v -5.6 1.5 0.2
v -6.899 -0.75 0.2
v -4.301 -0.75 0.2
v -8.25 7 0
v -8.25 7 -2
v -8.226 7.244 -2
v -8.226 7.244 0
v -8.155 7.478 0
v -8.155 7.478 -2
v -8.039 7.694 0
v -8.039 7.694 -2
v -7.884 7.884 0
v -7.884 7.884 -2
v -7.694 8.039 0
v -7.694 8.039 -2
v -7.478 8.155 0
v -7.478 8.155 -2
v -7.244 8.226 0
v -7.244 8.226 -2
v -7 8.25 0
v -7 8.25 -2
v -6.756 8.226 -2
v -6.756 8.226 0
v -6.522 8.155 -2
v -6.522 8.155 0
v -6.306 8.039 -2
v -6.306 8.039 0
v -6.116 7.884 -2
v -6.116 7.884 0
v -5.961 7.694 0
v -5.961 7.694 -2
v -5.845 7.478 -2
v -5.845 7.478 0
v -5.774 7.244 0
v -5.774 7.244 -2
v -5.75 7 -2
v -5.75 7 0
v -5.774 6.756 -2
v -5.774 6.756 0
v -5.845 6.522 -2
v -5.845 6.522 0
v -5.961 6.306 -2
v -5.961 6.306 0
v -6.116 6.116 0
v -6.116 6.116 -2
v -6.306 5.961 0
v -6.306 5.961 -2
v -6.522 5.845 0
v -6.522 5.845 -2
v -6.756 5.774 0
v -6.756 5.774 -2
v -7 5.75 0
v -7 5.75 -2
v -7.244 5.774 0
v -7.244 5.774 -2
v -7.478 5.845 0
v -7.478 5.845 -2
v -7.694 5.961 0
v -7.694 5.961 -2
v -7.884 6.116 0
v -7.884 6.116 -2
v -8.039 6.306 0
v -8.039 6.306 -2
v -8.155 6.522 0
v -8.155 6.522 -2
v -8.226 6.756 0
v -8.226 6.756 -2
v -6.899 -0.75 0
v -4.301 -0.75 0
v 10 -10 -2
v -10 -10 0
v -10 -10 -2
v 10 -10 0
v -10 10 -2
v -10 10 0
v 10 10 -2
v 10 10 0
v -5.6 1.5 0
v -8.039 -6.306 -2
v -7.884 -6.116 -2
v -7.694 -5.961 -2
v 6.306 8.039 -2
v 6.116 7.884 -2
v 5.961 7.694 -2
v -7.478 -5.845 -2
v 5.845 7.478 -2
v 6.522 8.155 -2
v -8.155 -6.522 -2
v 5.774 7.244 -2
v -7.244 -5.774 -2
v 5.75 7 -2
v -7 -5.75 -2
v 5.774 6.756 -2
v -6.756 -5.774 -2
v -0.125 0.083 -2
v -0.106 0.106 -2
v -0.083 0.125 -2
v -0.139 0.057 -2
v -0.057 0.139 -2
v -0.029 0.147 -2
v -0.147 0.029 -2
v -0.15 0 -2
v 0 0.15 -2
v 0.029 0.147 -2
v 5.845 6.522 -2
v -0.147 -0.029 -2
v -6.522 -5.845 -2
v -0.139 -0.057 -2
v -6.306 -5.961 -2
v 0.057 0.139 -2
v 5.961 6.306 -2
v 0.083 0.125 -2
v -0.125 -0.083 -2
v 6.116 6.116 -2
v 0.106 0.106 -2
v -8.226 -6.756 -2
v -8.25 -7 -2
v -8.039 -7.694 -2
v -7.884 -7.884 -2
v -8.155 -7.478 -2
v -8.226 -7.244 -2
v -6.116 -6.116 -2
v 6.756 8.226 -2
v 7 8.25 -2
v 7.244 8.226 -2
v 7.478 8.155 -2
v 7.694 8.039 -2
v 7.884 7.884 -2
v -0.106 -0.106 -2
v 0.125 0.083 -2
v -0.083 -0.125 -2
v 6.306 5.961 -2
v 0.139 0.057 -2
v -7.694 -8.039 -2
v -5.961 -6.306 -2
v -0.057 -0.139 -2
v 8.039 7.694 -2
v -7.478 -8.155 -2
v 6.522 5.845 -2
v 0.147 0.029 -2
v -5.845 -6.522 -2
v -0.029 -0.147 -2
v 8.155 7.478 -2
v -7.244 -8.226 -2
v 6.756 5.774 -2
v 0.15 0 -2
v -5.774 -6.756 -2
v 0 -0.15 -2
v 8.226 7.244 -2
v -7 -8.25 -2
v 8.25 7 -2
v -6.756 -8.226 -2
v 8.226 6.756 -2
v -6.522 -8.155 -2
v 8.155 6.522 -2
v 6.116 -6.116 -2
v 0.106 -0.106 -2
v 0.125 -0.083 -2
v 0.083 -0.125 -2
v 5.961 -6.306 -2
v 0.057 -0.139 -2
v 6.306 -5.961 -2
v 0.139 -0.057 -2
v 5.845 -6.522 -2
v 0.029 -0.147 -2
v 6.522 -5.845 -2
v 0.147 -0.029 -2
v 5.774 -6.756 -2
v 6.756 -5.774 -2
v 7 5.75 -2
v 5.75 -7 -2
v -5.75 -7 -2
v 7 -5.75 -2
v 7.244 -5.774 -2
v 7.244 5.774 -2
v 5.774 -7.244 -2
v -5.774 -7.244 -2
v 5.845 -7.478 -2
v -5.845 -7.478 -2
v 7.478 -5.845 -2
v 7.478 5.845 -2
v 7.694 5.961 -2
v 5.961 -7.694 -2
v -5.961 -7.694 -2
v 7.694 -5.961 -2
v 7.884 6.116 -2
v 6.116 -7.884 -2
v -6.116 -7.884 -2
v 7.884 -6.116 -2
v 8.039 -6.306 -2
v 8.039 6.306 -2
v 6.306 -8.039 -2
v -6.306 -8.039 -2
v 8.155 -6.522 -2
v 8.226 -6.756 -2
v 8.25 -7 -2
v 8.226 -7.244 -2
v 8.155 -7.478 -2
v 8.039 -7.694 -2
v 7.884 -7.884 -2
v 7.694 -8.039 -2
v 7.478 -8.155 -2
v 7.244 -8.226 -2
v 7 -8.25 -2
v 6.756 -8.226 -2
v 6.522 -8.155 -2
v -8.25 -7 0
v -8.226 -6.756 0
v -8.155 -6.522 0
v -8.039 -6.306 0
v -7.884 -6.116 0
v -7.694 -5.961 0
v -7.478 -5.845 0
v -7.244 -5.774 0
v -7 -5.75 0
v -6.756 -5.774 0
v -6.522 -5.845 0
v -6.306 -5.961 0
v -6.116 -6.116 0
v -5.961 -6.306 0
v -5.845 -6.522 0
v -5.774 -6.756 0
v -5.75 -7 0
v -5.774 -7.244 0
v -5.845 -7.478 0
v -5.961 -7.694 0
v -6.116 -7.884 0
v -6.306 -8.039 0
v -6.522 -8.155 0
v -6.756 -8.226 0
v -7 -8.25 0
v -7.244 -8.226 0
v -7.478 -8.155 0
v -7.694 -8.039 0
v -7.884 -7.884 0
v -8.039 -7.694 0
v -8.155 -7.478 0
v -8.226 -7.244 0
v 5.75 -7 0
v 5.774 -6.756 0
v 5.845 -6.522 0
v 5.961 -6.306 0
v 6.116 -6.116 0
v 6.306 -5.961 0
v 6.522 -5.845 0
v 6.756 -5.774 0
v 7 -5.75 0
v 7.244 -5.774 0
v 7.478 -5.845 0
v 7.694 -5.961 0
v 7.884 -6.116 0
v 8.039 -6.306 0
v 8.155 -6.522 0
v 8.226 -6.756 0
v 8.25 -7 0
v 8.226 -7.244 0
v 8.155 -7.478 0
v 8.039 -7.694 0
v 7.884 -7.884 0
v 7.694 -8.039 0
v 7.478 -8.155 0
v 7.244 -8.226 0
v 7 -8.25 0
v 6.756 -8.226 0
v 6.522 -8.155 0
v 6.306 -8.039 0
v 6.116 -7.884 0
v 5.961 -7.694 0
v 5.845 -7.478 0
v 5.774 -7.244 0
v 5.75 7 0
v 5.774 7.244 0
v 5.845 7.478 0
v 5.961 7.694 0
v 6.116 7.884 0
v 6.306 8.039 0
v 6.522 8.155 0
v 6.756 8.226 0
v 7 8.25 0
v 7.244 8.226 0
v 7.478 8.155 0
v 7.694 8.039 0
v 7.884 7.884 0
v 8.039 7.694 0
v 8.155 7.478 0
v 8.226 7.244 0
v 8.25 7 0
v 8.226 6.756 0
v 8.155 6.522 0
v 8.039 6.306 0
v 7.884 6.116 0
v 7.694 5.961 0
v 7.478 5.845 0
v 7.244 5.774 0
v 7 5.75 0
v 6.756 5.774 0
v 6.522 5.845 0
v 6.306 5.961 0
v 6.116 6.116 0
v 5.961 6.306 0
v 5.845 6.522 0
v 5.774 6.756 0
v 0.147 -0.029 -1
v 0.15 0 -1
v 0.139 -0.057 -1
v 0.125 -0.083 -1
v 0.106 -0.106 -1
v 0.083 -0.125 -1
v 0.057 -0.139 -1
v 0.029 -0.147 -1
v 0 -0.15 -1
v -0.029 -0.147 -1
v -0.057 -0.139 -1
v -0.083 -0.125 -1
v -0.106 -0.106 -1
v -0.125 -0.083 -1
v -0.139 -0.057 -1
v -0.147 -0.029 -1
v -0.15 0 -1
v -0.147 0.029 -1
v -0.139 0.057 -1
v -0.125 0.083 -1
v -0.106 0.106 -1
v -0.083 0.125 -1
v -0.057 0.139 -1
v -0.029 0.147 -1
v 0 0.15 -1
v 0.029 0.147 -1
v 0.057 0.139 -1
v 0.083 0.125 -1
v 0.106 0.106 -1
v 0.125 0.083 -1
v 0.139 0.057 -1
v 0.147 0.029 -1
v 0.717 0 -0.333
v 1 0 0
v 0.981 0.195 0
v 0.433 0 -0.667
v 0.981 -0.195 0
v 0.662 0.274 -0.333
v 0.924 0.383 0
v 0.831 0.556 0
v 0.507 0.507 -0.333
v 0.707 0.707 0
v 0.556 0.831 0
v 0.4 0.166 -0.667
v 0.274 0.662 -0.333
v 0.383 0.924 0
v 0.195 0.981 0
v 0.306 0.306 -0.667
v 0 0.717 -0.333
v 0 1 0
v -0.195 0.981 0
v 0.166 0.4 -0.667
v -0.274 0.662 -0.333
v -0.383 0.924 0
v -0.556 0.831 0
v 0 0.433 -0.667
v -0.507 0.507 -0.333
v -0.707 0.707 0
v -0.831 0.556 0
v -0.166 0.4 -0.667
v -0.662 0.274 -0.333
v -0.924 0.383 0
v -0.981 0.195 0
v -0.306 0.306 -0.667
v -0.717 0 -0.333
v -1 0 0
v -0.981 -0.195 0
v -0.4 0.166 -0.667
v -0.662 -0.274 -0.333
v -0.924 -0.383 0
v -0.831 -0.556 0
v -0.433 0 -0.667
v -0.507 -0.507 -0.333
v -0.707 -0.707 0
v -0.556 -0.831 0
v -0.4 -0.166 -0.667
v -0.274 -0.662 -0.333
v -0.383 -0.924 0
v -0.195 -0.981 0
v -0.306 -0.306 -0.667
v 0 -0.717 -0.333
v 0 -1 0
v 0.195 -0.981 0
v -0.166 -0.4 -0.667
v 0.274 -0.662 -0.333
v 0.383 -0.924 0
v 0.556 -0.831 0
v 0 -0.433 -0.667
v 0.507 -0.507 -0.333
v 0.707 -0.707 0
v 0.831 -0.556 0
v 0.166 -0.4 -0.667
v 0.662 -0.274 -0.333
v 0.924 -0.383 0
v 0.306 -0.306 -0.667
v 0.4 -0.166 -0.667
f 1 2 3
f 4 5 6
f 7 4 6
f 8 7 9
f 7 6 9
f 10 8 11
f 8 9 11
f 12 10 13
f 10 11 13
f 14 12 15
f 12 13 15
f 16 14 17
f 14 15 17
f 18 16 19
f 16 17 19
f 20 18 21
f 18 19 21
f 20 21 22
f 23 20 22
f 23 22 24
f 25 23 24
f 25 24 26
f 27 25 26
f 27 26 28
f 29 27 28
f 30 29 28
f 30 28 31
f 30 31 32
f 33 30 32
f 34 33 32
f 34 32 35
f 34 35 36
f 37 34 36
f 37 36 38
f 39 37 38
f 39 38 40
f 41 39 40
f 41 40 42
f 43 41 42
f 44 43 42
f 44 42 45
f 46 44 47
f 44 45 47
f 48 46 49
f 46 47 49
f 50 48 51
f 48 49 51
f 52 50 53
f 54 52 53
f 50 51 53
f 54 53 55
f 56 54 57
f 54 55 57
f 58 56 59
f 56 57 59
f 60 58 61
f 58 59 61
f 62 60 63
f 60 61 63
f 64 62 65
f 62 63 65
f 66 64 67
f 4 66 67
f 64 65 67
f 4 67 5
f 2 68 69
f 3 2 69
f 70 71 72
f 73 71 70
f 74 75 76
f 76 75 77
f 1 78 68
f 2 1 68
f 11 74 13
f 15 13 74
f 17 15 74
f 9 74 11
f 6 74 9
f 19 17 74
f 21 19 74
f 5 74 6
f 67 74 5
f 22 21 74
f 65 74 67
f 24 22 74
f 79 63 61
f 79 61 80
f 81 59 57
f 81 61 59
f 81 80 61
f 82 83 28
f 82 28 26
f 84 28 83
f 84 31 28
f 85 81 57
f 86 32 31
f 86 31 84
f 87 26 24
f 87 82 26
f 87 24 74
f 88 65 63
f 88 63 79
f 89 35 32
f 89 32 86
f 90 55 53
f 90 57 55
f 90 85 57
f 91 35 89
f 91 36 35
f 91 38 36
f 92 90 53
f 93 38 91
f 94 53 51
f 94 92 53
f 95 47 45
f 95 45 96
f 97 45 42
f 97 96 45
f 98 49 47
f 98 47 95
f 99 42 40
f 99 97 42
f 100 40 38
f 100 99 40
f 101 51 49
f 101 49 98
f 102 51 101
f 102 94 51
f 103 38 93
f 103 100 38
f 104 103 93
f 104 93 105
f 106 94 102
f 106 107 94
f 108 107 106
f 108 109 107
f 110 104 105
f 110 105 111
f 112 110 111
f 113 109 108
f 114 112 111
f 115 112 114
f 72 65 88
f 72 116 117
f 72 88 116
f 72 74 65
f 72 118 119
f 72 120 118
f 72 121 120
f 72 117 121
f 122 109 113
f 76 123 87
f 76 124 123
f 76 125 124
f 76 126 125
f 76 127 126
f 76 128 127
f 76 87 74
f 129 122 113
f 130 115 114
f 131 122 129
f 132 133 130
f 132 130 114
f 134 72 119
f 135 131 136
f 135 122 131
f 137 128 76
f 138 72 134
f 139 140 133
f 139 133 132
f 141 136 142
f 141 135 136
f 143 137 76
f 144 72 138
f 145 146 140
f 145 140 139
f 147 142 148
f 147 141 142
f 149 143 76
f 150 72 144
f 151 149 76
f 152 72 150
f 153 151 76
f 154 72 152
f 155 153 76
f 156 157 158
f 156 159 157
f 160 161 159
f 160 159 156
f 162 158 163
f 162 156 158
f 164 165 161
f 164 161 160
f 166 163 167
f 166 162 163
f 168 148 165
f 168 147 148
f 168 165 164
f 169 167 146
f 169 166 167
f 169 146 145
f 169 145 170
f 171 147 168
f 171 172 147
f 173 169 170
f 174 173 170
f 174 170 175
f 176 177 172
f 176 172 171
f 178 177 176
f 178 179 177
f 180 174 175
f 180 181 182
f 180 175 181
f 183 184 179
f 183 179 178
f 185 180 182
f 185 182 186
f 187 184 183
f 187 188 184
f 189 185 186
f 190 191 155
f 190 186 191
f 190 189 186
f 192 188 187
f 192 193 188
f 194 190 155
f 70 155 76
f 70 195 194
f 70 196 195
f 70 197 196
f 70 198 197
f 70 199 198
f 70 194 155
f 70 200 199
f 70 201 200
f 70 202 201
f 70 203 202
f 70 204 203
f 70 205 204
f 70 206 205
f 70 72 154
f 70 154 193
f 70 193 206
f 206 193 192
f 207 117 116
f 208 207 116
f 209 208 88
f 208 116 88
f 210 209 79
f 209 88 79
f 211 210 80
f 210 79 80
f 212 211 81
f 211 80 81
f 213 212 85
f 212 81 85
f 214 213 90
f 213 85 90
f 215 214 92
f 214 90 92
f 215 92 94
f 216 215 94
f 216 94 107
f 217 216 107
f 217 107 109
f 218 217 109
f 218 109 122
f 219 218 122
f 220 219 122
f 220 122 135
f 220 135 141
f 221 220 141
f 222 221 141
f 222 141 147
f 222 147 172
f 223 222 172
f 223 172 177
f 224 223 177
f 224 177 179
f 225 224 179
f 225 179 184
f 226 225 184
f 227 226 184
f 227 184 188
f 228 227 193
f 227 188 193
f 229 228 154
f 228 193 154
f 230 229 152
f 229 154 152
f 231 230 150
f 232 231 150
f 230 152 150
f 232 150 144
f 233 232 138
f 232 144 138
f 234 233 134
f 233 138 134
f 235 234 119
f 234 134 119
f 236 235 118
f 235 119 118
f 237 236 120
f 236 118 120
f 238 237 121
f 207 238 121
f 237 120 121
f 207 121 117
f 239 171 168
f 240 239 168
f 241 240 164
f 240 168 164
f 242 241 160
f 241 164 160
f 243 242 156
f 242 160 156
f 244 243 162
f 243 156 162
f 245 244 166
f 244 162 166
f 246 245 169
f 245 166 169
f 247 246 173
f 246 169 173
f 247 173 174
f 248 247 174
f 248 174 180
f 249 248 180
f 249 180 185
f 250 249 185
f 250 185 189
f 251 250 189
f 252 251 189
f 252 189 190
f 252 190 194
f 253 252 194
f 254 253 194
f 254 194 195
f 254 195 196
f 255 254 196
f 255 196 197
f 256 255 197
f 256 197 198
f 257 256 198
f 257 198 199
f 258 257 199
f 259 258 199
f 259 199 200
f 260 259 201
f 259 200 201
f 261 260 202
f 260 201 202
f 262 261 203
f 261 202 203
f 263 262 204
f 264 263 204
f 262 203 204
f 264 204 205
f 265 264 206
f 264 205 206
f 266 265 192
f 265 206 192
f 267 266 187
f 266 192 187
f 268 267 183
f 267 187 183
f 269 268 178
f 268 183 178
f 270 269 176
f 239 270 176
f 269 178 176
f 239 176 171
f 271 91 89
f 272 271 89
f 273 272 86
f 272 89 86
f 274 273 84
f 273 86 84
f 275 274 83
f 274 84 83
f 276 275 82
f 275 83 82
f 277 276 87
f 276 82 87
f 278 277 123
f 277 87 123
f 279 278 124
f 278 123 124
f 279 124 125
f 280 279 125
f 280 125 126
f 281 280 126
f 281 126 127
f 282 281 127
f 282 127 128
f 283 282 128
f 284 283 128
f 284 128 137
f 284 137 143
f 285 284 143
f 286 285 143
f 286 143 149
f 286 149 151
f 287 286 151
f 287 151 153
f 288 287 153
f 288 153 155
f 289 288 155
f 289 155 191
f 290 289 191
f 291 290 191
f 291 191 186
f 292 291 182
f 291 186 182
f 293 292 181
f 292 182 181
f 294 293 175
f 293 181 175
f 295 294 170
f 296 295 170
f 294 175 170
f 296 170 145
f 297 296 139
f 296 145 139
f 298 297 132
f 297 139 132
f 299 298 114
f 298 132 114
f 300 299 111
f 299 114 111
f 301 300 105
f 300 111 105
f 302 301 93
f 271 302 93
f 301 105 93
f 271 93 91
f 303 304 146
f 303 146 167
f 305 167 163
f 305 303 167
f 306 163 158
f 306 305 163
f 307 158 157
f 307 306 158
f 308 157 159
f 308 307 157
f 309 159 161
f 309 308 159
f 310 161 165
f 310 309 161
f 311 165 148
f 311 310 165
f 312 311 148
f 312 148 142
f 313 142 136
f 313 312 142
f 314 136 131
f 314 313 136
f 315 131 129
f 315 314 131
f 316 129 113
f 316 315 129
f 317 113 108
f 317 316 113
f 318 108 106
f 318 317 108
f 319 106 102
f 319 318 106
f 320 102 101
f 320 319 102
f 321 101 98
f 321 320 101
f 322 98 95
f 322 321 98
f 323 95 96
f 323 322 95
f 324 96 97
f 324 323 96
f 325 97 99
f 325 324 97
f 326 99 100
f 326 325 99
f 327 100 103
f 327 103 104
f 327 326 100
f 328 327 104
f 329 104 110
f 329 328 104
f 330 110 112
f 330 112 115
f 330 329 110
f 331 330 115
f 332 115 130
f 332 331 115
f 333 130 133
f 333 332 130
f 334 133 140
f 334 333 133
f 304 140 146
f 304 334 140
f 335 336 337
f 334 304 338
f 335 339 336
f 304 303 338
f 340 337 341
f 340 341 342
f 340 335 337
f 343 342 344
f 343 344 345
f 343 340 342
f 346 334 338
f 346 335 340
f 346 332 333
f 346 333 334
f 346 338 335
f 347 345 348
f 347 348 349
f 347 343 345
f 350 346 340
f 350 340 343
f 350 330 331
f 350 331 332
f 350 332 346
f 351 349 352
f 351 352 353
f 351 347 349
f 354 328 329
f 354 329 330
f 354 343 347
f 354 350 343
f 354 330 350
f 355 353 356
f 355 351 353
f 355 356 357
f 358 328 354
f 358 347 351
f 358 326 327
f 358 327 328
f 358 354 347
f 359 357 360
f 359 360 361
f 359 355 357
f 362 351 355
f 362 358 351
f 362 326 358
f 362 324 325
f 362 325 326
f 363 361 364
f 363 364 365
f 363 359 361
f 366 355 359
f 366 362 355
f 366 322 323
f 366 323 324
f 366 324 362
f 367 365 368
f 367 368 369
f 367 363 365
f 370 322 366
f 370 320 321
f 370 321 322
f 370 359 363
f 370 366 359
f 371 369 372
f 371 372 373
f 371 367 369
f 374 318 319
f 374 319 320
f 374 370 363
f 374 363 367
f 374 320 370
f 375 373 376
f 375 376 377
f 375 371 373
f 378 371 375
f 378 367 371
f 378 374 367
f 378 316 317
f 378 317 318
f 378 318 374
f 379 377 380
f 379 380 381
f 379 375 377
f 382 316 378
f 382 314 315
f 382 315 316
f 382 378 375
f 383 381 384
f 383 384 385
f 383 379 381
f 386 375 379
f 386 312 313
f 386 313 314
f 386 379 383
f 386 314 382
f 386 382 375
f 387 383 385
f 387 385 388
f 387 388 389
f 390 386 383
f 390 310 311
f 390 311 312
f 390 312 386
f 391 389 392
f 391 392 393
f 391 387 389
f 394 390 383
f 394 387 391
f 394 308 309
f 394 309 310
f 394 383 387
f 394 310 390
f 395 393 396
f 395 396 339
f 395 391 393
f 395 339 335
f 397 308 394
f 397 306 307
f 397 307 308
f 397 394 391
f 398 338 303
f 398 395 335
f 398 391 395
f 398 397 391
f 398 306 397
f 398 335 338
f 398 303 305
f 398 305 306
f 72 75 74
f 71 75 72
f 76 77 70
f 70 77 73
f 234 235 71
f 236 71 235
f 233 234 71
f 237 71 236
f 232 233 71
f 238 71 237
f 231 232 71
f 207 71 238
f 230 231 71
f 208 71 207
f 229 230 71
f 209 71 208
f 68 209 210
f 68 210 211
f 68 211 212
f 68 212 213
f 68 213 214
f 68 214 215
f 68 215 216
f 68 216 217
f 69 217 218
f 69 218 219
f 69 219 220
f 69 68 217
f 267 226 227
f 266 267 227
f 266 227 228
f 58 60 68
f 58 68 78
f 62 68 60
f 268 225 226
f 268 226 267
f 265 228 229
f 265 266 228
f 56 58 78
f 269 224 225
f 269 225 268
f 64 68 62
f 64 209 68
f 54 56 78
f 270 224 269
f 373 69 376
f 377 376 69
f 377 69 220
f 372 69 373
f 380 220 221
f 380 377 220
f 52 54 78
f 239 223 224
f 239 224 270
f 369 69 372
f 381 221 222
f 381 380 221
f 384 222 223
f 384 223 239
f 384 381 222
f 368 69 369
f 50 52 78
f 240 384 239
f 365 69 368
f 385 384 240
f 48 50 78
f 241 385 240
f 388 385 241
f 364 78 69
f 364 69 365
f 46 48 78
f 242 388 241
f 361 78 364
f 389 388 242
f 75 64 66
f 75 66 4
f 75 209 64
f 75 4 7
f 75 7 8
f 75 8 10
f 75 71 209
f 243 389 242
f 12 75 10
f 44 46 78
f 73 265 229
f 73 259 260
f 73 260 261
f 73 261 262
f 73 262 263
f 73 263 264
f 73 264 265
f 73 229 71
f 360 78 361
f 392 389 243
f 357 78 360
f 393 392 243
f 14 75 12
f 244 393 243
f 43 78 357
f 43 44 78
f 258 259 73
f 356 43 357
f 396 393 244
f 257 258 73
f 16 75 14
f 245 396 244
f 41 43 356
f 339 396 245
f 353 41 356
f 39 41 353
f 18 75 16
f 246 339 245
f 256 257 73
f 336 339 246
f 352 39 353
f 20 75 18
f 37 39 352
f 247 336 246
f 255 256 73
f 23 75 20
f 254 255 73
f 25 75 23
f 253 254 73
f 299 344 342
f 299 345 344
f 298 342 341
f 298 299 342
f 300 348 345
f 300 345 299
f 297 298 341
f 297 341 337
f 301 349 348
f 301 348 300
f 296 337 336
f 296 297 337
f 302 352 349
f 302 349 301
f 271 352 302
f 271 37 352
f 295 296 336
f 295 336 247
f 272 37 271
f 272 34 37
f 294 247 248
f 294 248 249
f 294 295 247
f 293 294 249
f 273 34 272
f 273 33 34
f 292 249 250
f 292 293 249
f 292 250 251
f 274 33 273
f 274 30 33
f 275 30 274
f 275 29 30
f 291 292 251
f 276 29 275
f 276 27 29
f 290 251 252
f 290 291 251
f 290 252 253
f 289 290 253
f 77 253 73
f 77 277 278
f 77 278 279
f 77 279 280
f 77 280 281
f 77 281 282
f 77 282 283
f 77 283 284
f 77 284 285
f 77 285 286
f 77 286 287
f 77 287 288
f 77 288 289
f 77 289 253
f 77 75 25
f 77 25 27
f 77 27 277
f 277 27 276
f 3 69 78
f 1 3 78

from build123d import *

# Parameters (mm, degrees)
F0_W      = 20
F0_H      = 20
F1_DEPTH  = 1
F2_R      = 1
F3_R      = 0.15
F6_W      = 20
F6_H      = 20
F6_R      = 0.15
F7_DEPTH  = 1
F8_D      = 2.5
F10_DEPTH = 0.2


with BuildPart() as f1:
    # F0 (on Top) → F1 (new body)
    with BuildSketch(Plane.XY):
        Rectangle(F0_W, F0_H)
    extrude(amount=-F1_DEPTH)

    # F2 (on face) → F4 section 0
    with BuildSketch(Plane.XY):
        Circle(F2_R)
    # F3 (on face) → F4 section 1
    with BuildSketch(Plane(origin=(0, 0, -1), x_dir=(1, 0, 0), z_dir=(0, 0, -1))):
        Circle(F3_R)
    loft(mode=Mode.SUBTRACT)

    # F6 (on face) → F7 (join)
    with BuildSketch(Plane(origin=(0, 0, -1), x_dir=(1, 0, 0), z_dir=(0, 0, -1))):
        Rectangle(F6_W, F6_H)
        Circle(F6_R, mode=Mode.SUBTRACT)
    extrude(amount=F7_DEPTH)

    # F8 (through all)
    with Locations(Plane.XY):
        with Locations((-7, -7), (7, -7), (7, 7), (-7, 7)):
            Hole(F8_D / 2)

    # F9 (on face) → F10 (join)
    with BuildSketch(Plane.XY):
        Polygon((-4.3009618943, -0.75), (-5.6, 1.5), (-6.8990381057, -0.75), align=None)
    extrude(amount=F10_DEPTH)


solid = f1.part
